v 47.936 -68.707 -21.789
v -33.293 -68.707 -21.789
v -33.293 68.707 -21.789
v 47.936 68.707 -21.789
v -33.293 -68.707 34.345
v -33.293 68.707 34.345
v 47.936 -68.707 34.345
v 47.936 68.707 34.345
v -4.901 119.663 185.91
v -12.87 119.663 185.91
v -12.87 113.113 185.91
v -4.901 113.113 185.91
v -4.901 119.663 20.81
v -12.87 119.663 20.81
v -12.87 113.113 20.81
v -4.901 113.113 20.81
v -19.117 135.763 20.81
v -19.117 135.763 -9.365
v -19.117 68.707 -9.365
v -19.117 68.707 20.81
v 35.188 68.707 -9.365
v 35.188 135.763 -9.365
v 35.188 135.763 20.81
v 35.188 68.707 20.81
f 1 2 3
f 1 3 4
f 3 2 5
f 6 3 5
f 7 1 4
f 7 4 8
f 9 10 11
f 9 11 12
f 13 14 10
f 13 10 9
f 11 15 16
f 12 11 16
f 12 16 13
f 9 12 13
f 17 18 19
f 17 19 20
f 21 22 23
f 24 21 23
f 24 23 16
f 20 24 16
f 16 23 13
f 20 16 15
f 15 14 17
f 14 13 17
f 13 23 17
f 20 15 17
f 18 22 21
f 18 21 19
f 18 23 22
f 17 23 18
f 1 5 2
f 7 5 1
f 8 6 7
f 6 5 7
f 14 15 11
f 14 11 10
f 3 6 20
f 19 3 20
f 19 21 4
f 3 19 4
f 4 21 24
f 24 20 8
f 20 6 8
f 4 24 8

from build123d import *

# Parameters (mm, degrees)
F0_W     = 81.2292
F0_H     = 56.134
F1_DEPTH = 68.707
F2_W     = 54.3052
F2_H     = 30.1752
F3_DEPTH = 67.056
F4_W     = 7.969416
F4_H     = 6.550535
F5_DEPTH = 165.1


with BuildPart() as f1:
    # F0 (on Front) → F1 (new body, symmetric)
    with BuildSketch(Plane.XZ):
        with Locations((7.321676, 6.277784)):
            Rectangle(F0_W, F0_H)
    extrude(amount=F1_DEPTH, both=True)

    # F2 (on face) → F3 (join, symmetric)
    with BuildSketch(Plane(origin=(0, 68.707, 0), x_dir=(-1, 0, 0), z_dir=(0, 1, 0))):
        with Locations((-8.035632, 5.722342)):
            Rectangle(F2_W, F2_H)
    extrude(amount=F3_DEPTH, both=True)

    # F4 (on face) → F5 (join)
    with BuildSketch(Plane.XY.offset(20.809942)):
        with Locations((-8.885605, 116.388052)):
            Rectangle(F4_W, F4_H)
    extrude(amount=F5_DEPTH)


solid = f1.part
